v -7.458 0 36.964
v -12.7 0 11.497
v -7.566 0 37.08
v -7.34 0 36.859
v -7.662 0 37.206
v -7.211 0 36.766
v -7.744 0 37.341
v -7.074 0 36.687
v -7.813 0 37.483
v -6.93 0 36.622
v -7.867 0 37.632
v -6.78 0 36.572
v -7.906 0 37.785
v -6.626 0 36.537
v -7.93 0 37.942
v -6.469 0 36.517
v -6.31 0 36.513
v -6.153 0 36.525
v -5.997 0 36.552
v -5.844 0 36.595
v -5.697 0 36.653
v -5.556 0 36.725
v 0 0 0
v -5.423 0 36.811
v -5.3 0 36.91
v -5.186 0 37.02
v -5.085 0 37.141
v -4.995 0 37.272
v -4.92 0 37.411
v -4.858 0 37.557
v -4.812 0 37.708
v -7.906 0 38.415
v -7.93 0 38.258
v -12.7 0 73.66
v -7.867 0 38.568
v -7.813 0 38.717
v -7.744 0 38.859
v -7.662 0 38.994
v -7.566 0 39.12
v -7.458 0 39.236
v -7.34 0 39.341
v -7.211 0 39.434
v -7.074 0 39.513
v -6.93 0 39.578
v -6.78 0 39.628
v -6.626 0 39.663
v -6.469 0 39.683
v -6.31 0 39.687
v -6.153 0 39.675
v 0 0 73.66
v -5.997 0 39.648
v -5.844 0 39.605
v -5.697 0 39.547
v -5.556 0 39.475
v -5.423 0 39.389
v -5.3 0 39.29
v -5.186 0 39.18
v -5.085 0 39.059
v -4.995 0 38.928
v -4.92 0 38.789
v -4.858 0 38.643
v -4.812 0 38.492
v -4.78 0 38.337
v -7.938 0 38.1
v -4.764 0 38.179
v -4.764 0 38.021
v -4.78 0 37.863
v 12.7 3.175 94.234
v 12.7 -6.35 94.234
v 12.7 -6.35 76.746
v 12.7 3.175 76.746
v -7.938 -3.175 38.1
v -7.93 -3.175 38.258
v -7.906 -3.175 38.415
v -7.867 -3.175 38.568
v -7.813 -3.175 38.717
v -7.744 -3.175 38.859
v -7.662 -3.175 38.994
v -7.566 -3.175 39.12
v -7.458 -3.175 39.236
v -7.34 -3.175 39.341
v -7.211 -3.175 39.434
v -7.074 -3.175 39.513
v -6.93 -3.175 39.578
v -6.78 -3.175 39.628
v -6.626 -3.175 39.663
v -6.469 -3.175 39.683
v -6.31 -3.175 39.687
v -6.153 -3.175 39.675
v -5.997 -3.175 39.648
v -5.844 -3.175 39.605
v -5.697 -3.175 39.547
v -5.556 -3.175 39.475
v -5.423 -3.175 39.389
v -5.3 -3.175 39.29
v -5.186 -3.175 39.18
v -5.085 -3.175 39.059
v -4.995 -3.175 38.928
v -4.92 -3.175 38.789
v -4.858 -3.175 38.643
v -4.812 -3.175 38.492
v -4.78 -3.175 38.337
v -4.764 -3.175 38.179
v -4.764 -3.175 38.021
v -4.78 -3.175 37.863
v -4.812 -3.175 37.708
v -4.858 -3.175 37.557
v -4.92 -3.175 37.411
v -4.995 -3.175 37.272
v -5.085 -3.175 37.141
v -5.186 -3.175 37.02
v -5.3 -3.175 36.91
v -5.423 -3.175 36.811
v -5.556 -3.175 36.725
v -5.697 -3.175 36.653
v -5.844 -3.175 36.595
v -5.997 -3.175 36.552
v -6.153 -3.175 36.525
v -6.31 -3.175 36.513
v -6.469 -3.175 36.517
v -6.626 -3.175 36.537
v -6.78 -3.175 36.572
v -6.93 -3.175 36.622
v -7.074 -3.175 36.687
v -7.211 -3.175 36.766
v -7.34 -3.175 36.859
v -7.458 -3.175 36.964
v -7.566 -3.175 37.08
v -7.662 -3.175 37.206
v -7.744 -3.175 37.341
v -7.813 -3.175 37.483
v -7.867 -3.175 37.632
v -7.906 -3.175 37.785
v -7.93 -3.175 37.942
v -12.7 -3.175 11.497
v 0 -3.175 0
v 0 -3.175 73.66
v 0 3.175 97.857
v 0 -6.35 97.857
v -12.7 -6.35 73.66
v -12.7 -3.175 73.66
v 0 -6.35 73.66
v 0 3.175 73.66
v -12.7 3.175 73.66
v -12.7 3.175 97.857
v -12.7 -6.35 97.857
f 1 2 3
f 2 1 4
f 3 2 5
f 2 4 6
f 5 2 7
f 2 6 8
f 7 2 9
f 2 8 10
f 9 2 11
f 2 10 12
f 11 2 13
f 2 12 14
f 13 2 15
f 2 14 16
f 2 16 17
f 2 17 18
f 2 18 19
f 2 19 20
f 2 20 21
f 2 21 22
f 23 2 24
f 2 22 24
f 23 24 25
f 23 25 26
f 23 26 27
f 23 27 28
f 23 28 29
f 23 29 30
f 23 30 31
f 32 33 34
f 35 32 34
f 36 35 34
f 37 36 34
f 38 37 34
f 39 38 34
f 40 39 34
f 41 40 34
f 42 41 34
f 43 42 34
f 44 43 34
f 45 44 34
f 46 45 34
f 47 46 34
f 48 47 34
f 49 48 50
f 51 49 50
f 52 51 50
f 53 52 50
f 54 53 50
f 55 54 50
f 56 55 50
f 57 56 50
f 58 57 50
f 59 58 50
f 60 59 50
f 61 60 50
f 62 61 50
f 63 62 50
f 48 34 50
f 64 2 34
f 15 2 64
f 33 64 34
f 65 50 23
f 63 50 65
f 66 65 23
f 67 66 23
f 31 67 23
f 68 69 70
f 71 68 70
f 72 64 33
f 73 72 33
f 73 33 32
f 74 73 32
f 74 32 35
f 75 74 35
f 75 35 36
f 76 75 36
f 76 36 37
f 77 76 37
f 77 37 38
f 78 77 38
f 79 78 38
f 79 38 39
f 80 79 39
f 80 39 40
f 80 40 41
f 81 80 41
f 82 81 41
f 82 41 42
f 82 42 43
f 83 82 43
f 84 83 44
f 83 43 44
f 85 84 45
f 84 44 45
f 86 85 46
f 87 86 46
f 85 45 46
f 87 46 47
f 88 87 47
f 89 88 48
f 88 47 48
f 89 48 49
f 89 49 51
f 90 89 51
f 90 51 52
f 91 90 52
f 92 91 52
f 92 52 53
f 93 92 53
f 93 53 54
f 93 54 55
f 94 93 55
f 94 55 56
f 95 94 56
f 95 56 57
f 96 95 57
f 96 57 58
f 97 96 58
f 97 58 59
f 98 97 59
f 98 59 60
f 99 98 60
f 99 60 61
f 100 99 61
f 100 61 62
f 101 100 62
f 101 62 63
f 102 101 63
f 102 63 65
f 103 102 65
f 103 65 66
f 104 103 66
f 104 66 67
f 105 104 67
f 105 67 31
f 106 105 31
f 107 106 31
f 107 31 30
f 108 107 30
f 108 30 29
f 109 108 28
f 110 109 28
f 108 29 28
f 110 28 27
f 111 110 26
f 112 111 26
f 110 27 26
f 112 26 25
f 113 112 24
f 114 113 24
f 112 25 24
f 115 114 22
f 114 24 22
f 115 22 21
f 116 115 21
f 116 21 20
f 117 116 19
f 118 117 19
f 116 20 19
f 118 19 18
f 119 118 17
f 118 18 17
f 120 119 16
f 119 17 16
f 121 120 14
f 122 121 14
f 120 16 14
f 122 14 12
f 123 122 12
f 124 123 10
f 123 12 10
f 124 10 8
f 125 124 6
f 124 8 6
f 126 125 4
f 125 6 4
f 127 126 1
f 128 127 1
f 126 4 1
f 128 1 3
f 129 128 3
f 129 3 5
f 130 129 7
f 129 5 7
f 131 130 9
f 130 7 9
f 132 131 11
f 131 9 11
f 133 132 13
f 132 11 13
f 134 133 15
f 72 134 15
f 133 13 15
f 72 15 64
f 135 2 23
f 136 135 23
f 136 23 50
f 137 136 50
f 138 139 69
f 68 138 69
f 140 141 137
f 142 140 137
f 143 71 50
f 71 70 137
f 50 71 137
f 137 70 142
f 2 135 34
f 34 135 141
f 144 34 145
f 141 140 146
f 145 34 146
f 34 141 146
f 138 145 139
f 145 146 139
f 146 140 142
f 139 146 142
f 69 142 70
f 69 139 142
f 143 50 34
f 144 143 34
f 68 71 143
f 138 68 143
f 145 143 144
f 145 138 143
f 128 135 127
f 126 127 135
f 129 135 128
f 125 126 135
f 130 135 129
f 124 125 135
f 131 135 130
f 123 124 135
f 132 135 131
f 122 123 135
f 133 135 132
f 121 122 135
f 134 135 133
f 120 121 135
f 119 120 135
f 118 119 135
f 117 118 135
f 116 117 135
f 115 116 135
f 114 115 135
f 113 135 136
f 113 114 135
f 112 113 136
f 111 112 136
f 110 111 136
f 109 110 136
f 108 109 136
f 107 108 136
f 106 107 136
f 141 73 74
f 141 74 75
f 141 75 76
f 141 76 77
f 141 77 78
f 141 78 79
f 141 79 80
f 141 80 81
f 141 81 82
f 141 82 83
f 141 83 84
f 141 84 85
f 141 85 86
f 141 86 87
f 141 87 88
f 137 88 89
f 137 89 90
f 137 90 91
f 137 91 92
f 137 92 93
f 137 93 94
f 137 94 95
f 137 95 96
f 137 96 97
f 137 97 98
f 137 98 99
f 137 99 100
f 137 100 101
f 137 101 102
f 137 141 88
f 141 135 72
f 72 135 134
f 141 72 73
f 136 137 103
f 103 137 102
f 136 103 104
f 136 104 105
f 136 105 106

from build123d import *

# Parameters (mm, degrees)
F1_DEPTH = 3.175
F3_DEPTH = 3.175
F5_DEPTH = 3.175
F8_D     = 3.175


with BuildPart() as f1:
    # F0 (on Front) → F1 (new body)
    with BuildSketch(Plane.XZ):
        Polygon((-12.7, 11.496929), (0, 0), (0, 73.66), (12.7, 76.746243), (12.7, 94.234135), (0, 97.856929), (-12.7, 97.856929), align=None)
    extrude(amount=F1_DEPTH)

    # F2 (on face) → F3 (join)
    with BuildSketch(Plane.XZ.offset(3.175)):
        Polygon((0, 97.856929), (-12.7, 97.856929), (-12.7, 73.66), (0, 73.66), (12.7, 76.746243), (12.7, 94.234135), align=None)
    extrude(amount=F3_DEPTH)

    # F4 (on face) → F5 (join)
    with BuildSketch(Plane(origin=(0, 0, 0), x_dir=(-1, 0, 0), z_dir=(0, 1, 0))):
        Polygon((-12.7, 76.746243), (0, 73.66), (12.7, 73.66), (12.7, 97.856929), (0, 97.856929), (-12.7, 94.234135), align=None)
    extrude(amount=F5_DEPTH)

    # F8 (through all)
    with Locations(Plane.XZ.offset(3.175)):
        with Locations((-6.35, 38.1)):
            Hole(F8_D / 2)


solid = f1.part
